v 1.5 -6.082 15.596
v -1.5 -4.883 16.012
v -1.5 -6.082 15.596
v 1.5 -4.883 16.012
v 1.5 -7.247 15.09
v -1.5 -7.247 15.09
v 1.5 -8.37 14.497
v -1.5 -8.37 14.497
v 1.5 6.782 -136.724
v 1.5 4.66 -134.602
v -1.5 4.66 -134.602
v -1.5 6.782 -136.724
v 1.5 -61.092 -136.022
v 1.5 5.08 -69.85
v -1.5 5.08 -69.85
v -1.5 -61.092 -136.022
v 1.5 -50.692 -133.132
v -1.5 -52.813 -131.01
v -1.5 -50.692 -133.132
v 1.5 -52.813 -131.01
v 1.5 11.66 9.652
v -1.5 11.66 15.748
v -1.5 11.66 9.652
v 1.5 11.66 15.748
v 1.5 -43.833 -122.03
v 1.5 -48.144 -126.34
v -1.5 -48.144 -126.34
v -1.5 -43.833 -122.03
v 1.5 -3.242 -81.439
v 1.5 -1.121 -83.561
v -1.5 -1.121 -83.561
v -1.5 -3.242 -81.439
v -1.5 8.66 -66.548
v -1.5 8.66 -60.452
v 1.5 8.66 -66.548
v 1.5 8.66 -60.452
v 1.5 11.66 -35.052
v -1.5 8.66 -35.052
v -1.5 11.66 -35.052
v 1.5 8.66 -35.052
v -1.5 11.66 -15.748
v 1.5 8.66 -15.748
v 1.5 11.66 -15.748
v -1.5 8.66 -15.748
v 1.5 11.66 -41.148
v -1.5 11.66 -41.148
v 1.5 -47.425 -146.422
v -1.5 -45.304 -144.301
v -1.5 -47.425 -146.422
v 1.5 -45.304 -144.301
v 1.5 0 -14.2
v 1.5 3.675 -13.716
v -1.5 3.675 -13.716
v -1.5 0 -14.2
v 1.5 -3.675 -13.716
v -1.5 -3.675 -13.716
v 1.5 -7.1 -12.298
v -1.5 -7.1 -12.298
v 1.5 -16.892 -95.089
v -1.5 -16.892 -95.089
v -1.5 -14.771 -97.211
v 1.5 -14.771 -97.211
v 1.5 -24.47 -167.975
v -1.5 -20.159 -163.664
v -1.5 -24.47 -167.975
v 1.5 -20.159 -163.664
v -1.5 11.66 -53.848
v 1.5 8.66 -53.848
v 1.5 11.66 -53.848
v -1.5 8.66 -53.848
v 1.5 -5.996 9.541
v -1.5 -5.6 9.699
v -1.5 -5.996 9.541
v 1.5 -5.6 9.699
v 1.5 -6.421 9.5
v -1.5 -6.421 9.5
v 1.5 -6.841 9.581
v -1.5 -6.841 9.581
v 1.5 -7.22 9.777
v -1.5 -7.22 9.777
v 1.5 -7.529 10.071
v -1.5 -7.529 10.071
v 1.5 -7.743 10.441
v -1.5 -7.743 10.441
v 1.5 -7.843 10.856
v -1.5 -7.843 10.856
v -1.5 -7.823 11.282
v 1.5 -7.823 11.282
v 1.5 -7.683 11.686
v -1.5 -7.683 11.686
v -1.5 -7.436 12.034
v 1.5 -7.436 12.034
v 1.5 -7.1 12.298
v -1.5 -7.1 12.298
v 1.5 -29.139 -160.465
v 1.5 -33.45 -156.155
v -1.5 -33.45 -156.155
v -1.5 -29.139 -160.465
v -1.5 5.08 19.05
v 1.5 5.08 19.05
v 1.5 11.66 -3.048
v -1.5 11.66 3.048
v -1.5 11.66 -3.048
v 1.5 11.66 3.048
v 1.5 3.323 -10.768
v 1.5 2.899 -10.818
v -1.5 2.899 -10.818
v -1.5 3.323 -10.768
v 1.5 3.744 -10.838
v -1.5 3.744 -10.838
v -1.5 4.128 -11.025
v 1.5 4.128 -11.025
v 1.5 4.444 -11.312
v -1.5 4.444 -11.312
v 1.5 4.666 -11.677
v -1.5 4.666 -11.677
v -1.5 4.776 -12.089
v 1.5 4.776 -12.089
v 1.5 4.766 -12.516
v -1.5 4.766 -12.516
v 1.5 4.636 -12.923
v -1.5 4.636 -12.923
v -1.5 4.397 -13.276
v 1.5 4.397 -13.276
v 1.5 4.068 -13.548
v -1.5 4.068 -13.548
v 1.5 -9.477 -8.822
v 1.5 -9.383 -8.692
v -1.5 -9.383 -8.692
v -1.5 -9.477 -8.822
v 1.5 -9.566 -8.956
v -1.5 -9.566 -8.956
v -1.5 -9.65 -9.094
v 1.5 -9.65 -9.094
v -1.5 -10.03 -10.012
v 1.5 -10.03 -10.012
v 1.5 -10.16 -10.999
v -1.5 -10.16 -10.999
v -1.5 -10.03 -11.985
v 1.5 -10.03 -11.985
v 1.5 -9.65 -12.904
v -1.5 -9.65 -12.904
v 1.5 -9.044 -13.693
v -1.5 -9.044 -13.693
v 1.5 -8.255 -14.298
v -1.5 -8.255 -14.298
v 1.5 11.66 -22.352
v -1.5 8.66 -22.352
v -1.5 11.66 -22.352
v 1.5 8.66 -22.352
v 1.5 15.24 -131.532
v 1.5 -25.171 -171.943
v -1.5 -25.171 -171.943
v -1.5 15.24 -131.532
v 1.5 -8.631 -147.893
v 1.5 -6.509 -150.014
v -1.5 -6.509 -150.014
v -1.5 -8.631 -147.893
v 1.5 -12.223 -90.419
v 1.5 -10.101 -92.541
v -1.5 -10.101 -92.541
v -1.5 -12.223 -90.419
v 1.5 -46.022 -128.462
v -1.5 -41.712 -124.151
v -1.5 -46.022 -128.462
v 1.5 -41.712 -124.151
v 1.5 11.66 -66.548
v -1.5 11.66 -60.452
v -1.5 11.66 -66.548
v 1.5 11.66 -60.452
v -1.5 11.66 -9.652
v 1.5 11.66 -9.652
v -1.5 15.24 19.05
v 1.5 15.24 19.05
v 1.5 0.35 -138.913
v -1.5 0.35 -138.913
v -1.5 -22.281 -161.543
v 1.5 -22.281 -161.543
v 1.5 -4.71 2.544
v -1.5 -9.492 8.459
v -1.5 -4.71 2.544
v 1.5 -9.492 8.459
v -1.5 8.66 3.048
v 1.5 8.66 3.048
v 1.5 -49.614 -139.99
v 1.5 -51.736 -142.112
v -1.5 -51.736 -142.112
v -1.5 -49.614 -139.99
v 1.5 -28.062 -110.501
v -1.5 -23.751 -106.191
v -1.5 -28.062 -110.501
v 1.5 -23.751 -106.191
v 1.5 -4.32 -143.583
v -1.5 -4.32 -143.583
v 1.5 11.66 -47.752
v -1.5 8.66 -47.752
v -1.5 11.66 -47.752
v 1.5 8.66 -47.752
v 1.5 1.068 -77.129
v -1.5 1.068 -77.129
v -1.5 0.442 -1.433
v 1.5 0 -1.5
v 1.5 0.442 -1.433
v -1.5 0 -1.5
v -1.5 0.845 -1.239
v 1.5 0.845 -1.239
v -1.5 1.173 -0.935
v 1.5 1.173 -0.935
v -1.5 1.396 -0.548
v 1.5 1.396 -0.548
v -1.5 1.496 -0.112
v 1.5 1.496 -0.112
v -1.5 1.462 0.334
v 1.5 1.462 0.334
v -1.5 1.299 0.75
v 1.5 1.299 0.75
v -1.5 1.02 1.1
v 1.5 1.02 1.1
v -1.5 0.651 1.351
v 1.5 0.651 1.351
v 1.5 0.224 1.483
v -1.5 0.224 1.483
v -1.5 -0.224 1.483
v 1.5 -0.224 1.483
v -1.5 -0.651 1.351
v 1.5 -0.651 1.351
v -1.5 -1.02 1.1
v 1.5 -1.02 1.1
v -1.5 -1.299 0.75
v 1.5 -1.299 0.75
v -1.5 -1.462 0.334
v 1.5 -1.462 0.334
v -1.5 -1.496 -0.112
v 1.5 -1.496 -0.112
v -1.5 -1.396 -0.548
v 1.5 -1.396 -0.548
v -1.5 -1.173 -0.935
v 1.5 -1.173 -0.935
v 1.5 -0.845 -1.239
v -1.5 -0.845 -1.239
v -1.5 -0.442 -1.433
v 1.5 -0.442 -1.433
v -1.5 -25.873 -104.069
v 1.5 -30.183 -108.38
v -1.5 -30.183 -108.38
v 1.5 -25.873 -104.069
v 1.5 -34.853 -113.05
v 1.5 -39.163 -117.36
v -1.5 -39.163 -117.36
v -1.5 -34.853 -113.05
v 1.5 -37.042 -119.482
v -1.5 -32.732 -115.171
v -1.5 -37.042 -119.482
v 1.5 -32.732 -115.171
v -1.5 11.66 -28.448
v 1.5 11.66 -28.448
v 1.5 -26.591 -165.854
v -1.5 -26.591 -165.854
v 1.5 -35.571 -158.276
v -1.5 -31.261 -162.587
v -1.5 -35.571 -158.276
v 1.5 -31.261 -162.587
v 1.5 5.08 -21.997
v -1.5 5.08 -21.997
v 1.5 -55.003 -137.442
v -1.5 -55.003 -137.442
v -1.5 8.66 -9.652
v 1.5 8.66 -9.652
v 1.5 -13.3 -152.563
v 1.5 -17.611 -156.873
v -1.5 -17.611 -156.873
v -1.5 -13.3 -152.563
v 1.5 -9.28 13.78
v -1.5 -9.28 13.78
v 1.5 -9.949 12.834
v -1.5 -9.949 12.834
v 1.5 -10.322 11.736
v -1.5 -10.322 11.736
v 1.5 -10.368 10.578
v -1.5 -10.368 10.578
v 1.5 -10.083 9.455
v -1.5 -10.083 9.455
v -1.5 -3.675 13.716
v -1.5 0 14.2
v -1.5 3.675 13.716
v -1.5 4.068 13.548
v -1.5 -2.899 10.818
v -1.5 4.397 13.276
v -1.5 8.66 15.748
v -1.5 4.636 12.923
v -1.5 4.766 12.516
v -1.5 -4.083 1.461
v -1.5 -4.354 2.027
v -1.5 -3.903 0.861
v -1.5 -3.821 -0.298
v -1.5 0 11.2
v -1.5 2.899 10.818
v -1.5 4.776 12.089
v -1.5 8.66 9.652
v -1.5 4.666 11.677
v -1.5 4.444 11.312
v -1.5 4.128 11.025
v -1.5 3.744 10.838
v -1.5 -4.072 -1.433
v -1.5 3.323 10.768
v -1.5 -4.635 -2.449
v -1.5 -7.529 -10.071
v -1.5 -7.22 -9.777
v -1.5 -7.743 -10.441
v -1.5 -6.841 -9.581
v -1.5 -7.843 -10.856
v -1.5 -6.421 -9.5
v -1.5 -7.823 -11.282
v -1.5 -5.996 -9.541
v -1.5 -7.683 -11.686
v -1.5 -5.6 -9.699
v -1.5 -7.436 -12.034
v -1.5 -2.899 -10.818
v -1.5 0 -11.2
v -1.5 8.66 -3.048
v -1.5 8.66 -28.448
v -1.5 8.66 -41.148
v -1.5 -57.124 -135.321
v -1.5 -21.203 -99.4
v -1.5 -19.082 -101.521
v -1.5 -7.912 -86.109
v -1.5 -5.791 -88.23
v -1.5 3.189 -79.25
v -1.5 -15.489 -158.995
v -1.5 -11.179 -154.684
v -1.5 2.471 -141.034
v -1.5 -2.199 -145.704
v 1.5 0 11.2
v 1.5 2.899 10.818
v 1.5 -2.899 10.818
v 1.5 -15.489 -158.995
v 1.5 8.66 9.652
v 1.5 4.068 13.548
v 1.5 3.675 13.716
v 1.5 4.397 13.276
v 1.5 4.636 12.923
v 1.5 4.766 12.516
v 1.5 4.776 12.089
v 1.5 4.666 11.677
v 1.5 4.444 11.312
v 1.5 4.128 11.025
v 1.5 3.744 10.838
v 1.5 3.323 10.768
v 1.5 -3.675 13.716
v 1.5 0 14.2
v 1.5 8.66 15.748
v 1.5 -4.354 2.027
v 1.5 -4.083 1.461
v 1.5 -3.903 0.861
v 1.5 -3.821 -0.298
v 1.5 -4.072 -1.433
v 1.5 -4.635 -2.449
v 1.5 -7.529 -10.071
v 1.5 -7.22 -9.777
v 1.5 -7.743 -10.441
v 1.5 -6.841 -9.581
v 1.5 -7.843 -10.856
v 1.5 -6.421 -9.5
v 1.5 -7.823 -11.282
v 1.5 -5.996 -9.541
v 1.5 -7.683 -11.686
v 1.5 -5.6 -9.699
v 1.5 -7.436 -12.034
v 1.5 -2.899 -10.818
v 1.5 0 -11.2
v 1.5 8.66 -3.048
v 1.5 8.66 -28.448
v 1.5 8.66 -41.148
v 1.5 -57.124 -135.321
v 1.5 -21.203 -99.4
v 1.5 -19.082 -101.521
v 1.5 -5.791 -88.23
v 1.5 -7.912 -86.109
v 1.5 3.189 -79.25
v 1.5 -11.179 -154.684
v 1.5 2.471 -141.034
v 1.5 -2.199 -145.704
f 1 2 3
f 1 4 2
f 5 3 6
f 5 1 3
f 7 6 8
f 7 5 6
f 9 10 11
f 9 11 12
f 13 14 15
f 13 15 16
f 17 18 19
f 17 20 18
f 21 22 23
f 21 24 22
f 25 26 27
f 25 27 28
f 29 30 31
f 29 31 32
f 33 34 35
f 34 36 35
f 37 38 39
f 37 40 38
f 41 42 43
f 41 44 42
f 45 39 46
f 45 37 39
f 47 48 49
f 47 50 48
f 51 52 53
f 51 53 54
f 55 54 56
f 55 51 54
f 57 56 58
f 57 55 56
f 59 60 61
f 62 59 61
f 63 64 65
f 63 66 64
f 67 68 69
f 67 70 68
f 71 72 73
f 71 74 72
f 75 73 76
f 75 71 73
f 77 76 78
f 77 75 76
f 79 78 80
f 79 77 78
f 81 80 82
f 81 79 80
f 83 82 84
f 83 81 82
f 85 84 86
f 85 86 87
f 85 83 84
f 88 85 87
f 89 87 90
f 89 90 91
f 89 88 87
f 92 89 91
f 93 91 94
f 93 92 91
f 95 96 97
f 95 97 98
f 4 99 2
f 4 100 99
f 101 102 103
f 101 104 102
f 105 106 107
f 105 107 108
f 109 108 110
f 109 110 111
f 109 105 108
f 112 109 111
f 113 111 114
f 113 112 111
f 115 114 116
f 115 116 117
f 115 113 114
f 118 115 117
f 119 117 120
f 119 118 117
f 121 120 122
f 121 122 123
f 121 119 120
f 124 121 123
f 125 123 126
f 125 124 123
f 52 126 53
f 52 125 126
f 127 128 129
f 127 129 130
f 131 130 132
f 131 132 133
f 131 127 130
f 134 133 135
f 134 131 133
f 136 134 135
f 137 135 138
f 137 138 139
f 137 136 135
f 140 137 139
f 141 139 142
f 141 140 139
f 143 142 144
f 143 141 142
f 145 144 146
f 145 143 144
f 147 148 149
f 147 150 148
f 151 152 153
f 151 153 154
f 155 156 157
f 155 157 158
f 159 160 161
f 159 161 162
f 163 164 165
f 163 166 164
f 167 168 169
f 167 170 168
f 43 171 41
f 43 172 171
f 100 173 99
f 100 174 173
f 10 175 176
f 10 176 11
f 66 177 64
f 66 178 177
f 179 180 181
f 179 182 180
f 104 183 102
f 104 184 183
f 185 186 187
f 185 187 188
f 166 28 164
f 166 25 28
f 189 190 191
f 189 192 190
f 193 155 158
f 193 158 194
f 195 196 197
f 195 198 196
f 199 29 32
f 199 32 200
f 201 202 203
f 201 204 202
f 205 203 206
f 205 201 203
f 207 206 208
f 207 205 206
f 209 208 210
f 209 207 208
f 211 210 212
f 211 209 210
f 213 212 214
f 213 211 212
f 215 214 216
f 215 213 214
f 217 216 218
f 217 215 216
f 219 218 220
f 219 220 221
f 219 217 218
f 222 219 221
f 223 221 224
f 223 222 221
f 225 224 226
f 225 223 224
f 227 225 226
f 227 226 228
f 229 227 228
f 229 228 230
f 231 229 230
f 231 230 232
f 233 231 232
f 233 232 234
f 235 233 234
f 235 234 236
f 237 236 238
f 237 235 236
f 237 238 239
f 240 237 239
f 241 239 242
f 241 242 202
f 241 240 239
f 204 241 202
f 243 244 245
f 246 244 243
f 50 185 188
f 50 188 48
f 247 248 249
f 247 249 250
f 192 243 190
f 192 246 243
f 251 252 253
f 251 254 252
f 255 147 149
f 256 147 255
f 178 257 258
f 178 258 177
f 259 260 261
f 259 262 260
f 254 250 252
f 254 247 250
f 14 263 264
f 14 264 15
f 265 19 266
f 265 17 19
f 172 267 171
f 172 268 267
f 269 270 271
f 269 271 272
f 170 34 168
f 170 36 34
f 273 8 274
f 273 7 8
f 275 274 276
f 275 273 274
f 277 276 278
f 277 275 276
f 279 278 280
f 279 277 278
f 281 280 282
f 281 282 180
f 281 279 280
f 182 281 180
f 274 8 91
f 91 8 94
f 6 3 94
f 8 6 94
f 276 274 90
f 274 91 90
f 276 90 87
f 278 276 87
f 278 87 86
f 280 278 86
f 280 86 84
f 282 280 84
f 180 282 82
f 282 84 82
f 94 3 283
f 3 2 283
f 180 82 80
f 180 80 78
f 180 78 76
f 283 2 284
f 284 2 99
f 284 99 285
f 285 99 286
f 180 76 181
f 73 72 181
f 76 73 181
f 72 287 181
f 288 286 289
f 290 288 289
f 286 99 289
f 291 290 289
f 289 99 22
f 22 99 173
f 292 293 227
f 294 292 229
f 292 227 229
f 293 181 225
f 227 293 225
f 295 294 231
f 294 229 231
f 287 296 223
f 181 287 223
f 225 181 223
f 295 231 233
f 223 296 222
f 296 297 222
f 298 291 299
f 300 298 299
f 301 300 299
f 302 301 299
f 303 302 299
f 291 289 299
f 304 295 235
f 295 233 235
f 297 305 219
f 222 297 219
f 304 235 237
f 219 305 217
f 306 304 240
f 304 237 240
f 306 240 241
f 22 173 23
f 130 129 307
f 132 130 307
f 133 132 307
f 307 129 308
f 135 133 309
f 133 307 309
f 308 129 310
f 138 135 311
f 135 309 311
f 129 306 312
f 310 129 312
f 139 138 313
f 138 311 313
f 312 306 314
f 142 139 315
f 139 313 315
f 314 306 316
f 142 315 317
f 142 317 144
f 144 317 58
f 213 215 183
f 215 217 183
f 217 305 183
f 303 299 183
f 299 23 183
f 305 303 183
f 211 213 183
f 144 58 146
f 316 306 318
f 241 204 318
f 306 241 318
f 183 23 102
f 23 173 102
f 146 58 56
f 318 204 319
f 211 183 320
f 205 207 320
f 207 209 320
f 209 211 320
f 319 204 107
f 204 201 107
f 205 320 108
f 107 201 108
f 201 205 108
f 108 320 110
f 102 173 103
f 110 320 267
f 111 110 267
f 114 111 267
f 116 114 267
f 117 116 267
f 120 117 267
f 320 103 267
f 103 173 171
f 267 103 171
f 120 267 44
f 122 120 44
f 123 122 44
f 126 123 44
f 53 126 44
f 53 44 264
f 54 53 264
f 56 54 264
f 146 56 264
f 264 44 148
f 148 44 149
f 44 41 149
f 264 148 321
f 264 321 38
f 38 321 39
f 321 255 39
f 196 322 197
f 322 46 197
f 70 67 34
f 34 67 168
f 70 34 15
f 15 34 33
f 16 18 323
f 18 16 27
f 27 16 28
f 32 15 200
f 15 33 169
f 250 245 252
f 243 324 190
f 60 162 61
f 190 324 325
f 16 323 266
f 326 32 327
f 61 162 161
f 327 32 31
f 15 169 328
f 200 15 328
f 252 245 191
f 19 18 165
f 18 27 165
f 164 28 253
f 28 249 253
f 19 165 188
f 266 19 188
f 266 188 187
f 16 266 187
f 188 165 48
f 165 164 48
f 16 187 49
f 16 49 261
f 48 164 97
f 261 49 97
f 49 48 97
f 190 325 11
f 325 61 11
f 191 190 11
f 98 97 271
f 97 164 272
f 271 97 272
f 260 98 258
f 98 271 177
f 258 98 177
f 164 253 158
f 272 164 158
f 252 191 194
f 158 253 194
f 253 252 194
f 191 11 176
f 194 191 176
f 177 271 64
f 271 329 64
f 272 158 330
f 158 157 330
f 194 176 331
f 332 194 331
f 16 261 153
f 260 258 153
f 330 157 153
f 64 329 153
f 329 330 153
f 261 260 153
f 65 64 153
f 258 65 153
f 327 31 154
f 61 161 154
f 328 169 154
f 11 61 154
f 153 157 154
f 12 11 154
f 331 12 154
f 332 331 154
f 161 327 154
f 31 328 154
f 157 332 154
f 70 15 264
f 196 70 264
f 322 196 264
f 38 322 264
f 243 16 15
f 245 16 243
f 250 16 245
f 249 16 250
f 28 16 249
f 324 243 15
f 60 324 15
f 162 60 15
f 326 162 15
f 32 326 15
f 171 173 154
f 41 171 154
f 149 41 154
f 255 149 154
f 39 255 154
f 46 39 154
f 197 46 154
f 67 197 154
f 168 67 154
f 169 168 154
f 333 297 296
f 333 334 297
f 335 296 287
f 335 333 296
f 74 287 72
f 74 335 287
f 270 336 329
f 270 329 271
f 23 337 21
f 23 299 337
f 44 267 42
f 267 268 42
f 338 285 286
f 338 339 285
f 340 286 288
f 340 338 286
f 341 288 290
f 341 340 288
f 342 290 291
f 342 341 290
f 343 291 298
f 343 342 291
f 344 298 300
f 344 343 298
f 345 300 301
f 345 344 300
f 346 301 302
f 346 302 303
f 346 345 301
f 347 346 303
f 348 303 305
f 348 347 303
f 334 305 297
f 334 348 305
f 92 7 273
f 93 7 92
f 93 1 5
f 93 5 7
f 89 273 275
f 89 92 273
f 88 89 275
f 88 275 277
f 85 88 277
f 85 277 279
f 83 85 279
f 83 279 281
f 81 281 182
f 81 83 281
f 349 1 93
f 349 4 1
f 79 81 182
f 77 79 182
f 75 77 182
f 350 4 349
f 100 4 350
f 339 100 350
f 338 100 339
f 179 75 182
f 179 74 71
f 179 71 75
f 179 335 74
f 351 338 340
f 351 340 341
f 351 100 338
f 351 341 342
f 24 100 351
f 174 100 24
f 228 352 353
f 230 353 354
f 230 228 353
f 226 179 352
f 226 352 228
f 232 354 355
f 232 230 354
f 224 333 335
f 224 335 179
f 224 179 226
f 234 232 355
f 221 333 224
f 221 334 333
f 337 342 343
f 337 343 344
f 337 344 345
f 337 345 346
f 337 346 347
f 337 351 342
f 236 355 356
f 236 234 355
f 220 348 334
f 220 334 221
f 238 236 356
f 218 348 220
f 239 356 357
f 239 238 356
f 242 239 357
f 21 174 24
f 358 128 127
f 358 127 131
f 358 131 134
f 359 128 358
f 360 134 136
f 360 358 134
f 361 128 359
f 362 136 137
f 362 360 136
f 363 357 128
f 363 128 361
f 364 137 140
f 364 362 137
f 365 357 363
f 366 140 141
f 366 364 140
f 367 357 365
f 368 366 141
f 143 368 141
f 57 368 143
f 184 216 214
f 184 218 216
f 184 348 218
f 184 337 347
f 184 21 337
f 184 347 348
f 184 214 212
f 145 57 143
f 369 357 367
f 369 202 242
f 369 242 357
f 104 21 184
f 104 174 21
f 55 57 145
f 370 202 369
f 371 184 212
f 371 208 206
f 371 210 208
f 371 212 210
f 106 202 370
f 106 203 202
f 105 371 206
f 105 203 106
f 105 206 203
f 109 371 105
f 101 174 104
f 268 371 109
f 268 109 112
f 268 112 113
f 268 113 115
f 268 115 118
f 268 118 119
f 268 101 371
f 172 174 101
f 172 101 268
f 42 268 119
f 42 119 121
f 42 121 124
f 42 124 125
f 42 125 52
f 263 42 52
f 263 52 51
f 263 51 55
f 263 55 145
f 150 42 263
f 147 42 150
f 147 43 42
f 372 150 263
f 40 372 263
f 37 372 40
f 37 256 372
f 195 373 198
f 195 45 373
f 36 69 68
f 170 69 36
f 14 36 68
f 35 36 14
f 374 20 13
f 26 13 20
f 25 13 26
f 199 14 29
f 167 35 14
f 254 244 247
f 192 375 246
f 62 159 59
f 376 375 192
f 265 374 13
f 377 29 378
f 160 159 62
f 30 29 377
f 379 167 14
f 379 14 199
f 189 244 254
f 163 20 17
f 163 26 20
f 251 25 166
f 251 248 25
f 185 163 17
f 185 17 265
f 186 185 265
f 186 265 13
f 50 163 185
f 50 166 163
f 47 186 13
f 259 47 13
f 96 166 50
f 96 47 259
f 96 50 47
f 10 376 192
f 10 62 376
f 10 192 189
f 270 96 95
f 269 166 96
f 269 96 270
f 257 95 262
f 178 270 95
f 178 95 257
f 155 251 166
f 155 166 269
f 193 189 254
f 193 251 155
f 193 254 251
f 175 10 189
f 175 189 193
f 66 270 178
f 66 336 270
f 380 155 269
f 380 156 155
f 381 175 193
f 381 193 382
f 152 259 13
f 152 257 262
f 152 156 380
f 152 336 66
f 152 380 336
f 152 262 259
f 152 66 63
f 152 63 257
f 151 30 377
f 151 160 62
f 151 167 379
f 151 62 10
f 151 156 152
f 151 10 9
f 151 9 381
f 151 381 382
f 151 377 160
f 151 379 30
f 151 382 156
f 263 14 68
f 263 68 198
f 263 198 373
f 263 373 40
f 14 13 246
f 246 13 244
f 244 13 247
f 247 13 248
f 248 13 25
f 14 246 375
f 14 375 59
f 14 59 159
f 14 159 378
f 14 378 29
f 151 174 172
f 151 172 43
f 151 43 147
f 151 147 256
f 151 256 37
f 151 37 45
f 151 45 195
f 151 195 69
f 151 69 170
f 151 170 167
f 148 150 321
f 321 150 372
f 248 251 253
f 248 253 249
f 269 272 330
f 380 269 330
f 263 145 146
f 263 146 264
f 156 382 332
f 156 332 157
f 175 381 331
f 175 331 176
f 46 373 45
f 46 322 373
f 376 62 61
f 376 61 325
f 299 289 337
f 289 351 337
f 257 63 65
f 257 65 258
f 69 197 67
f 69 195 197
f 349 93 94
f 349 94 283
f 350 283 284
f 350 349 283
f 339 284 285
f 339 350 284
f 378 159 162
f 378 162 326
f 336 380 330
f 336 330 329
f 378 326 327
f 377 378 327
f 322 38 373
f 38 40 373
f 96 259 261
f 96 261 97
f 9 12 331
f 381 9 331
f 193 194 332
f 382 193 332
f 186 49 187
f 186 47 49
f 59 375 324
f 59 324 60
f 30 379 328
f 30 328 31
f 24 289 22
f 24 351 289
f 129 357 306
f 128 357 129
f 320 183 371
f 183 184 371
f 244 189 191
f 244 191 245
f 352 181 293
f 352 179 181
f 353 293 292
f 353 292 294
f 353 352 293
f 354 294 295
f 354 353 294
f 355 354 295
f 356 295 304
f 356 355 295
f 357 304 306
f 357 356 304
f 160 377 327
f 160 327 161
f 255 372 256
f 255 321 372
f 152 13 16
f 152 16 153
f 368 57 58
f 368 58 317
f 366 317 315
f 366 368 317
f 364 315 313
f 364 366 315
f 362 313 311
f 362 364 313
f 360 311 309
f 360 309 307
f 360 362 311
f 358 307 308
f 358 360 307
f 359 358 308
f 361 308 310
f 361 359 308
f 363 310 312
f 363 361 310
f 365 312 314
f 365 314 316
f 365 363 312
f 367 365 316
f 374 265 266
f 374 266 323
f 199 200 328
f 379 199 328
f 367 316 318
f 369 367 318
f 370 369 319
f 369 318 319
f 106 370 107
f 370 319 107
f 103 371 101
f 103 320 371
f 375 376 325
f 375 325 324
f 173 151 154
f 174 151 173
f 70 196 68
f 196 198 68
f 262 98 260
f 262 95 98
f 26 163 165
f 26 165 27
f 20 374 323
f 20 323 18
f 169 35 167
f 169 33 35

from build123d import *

# Parameters (mm, degrees)
SKETCH1_R           = 1.5
SKETCH1_W           = 6.096
SKETCH1_H           = 3
BOSS_EXTRUDE1_DEPTH = 1.499997


with BuildPart() as part:
    # Sketch1 → Boss-Extrude1 (new, symmetric)
    # profile 1 of 2: a face of its own
    with BuildSketch(Plane(origin=(0, 0, 0), x_dir=(0, 0, -1), z_dir=(1, 0, 0))):
        with BuildLine():
            ThreePointArc((8.69240433, -9.382807016), (8.888743448, -9.522527669), (9.093522628, -9.649556788))
            ThreePointArc((9.093522628, -9.649556788), (11.98462319, -10.030177398), (14.298079416, -8.255))
            Line((14.298079416, -8.255), (21.997045256, 5.08))
            Line((21.997045256, 5.08), (69.85, 5.08))
            Line((69.85, 5.08), (136.022177029, -61.092177029))
            Line((136.022177029, -61.092177029), (171.943201513, -25.171152545))
            Line((171.943201513, -25.171152545), (131.532048969, 15.24))
            Line((131.532048969, 15.24), (-19.050000183, 15.24))
            Line((-19.050000183, 15.24), (-19.050000183, 5.08))
            Line((-19.050000183, 5.08), (-7.332348419, 5.08))
            Line((-7.332348419, 5.08), (-3.299556755, -1.905000058))
            ThreePointArc((-3.299556755, -1.905000058), (-2.694076843, -2.694076843), (-1.905000058, -3.299556755))
            Line((-1.905000058, -3.299556755), (-0.860541922, -3.902574941))
            ThreePointArc((-0.860541922, -3.902574941), (0.874622108, -3.905666115), (2.448919028, -4.635318757))
            Line((2.448919028, -4.635318757), (8.69240433, -9.382807016))
        make_face()
        Polygon((137.442047446, -55.00257343), (135.320727102, -57.123893773), (131.010204164, -52.813370835), (133.131524508, -50.692050491), align=None, mode=Mode.SUBTRACT)
        Polygon((142.111780629, -51.7357401), (139.990460285, -49.614419757), (144.300983223, -45.303896819), (146.422303567, -47.425217162), align=None, mode=Mode.SUBTRACT)
        Polygon((128.461791325, -46.022317308), (126.340470981, -48.143637652), (122.029948043, -43.833114714), (124.151268387, -41.71179437), align=None, mode=Mode.SUBTRACT)
        Polygon((119.481535204, -37.042061187), (117.36021486, -39.163381531), (113.049691922, -34.852858593), (115.171012265, -32.731538249), align=None, mode=Mode.SUBTRACT)
        Polygon((110.501279083, -28.061805066), (108.379958739, -30.18312541), (104.069435801, -25.872602472), (106.190756144, -23.751282128), align=None, mode=Mode.SUBTRACT)
        Polygon((158.276241647, -35.571279083), (156.154921303, -33.449958739), (160.465444241, -29.139435801), (162.586764585, -31.260756144), align=None, mode=Mode.SUBTRACT)
        Polygon((167.974918257, -24.469702618), (165.853597914, -26.591022961), (161.543074976, -22.280500023), (163.664395319, -20.15917968), align=None, mode=Mode.SUBTRACT)
        Circle(SKETCH1_R, mode=Mode.SUBTRACT)
        with BuildLine():
            ThreePointArc((13.716146733, 3.67523044), (14.078517032, -1.85347193), (12.297560734, -7.1))
            ThreePointArc((12.297560734, -7.1), (10.248522628, -7.649038106), (9.699484522, -5.6))
            ThreePointArc((9.699484522, -5.6), (11.104182447, -1.461893353), (10.818369254, 2.898773305))
            ThreePointArc((10.818369254, 2.898773305), (11.879029426, 4.735890612), (13.716146733, 3.67523044))
        make_face(mode=Mode.SUBTRACT)
        with Locations((-12.700000556, 10.16)):
            Rectangle(SKETCH1_W, SKETCH1_H, mode=Mode.SUBTRACT)
        with Locations((-5.56e-07, 10.16)):
            Rectangle(SKETCH1_W, SKETCH1_H, mode=Mode.SUBTRACT)
        with Locations((12.699999444, 10.16)):
            Rectangle(SKETCH1_W, SKETCH1_H, mode=Mode.SUBTRACT)
        with Locations((25.399999444, 10.16)):
            Rectangle(SKETCH1_W, SKETCH1_H, mode=Mode.SUBTRACT)
        with Locations((38.099999444, 10.16)):
            Rectangle(SKETCH1_W, SKETCH1_H, mode=Mode.SUBTRACT)
        with Locations((50.799999444, 10.16)):
            Rectangle(SKETCH1_W, SKETCH1_H, mode=Mode.SUBTRACT)
        with Locations((63.499999444, 10.16)):
            Rectangle(SKETCH1_W, SKETCH1_H, mode=Mode.SUBTRACT)
        Polygon((101.521022961, -19.081548945), (99.399702618, -21.202869289), (95.08917968, -16.892346351), (97.210500023, -14.771026007), align=None, mode=Mode.SUBTRACT)
        Polygon((92.54076684, -10.101292824), (90.419446497, -12.222613168), (86.108923559, -7.91209023), (88.230243902, -5.790769886), align=None, mode=Mode.SUBTRACT)
        Polygon((158.994662136, -15.489446497), (156.873341793, -17.61076684), (152.562818855, -13.300243902), (154.684139198, -11.178923559), align=None, mode=Mode.SUBTRACT)
        Polygon((150.014406015, -6.509190376), (147.893085672, -8.630510719), (143.582562734, -4.319987781), (145.703883077, -2.198667438), align=None, mode=Mode.SUBTRACT)
        Polygon((83.560510719, -1.121036703), (81.439190376, -3.242357047), (77.128667438, 1.068165891), (79.249987781, 3.189486235), align=None, mode=Mode.SUBTRACT)
        Polygon((141.034149894, 2.471065745), (138.912829551, 0.349745402), (134.602306612, 4.66026834), (136.723626956, 6.781588683), align=None, mode=Mode.SUBTRACT)
    # profile 2 of 2: a face of its own
    with BuildSketch(Plane(origin=(0, 0, 0), x_dir=(0, 0, -1), z_dir=(1, 0, 0))):
        with BuildLine():
            ThreePointArc((-2.543703742, -4.709644618), (-1.749303433, -4.207713583), (-0.860541922, -3.902574941))
            Line((-0.860541922, -3.902574941), (-1.905000058, -3.299556755))
            ThreePointArc((-1.905000058, -3.299556755), (-2.694076843, -2.694076843), (-3.299556755, -1.905000058))
            Line((-3.299556755, -1.905000058), (-7.332348419, 5.08))
            Line((-7.332348419, 5.08), (-19.050000183, 5.08))
            Line((-19.050000183, 5.08), (-16.012126569, -4.882561423))
            ThreePointArc((-16.012126569, -4.882561423), (-15.354032248, -6.669430071), (-14.497265375, -8.370000042))
            ThreePointArc((-14.497265375, -8.370000042), (-11.736319841, -10.322059404), (-8.458544034, -9.491672897))
            Line((-8.458544034, -9.491672897), (-2.543703742, -4.709644618))
        make_face()
        with BuildLine():
            ThreePointArc((-12.297560842, -7.100000054), (-14.078517108, -1.853471934), (-13.716146726, 3.675230466))
            ThreePointArc((-13.716146726, 3.675230466), (-11.879029401, 4.735890605), (-10.818369261, 2.89877328))
            ThreePointArc((-10.818369261, 2.89877328), (-11.104182519, -1.461893392), (-9.699484623, -5.600000067))
            ThreePointArc((-9.699484623, -5.600000067), (-10.24852274, -7.64903817), (-12.297560842, -7.100000054))
        make_face(mode=Mode.SUBTRACT)
    extrude(amount=BOSS_EXTRUDE1_DEPTH, both=True)


solid = part.part
